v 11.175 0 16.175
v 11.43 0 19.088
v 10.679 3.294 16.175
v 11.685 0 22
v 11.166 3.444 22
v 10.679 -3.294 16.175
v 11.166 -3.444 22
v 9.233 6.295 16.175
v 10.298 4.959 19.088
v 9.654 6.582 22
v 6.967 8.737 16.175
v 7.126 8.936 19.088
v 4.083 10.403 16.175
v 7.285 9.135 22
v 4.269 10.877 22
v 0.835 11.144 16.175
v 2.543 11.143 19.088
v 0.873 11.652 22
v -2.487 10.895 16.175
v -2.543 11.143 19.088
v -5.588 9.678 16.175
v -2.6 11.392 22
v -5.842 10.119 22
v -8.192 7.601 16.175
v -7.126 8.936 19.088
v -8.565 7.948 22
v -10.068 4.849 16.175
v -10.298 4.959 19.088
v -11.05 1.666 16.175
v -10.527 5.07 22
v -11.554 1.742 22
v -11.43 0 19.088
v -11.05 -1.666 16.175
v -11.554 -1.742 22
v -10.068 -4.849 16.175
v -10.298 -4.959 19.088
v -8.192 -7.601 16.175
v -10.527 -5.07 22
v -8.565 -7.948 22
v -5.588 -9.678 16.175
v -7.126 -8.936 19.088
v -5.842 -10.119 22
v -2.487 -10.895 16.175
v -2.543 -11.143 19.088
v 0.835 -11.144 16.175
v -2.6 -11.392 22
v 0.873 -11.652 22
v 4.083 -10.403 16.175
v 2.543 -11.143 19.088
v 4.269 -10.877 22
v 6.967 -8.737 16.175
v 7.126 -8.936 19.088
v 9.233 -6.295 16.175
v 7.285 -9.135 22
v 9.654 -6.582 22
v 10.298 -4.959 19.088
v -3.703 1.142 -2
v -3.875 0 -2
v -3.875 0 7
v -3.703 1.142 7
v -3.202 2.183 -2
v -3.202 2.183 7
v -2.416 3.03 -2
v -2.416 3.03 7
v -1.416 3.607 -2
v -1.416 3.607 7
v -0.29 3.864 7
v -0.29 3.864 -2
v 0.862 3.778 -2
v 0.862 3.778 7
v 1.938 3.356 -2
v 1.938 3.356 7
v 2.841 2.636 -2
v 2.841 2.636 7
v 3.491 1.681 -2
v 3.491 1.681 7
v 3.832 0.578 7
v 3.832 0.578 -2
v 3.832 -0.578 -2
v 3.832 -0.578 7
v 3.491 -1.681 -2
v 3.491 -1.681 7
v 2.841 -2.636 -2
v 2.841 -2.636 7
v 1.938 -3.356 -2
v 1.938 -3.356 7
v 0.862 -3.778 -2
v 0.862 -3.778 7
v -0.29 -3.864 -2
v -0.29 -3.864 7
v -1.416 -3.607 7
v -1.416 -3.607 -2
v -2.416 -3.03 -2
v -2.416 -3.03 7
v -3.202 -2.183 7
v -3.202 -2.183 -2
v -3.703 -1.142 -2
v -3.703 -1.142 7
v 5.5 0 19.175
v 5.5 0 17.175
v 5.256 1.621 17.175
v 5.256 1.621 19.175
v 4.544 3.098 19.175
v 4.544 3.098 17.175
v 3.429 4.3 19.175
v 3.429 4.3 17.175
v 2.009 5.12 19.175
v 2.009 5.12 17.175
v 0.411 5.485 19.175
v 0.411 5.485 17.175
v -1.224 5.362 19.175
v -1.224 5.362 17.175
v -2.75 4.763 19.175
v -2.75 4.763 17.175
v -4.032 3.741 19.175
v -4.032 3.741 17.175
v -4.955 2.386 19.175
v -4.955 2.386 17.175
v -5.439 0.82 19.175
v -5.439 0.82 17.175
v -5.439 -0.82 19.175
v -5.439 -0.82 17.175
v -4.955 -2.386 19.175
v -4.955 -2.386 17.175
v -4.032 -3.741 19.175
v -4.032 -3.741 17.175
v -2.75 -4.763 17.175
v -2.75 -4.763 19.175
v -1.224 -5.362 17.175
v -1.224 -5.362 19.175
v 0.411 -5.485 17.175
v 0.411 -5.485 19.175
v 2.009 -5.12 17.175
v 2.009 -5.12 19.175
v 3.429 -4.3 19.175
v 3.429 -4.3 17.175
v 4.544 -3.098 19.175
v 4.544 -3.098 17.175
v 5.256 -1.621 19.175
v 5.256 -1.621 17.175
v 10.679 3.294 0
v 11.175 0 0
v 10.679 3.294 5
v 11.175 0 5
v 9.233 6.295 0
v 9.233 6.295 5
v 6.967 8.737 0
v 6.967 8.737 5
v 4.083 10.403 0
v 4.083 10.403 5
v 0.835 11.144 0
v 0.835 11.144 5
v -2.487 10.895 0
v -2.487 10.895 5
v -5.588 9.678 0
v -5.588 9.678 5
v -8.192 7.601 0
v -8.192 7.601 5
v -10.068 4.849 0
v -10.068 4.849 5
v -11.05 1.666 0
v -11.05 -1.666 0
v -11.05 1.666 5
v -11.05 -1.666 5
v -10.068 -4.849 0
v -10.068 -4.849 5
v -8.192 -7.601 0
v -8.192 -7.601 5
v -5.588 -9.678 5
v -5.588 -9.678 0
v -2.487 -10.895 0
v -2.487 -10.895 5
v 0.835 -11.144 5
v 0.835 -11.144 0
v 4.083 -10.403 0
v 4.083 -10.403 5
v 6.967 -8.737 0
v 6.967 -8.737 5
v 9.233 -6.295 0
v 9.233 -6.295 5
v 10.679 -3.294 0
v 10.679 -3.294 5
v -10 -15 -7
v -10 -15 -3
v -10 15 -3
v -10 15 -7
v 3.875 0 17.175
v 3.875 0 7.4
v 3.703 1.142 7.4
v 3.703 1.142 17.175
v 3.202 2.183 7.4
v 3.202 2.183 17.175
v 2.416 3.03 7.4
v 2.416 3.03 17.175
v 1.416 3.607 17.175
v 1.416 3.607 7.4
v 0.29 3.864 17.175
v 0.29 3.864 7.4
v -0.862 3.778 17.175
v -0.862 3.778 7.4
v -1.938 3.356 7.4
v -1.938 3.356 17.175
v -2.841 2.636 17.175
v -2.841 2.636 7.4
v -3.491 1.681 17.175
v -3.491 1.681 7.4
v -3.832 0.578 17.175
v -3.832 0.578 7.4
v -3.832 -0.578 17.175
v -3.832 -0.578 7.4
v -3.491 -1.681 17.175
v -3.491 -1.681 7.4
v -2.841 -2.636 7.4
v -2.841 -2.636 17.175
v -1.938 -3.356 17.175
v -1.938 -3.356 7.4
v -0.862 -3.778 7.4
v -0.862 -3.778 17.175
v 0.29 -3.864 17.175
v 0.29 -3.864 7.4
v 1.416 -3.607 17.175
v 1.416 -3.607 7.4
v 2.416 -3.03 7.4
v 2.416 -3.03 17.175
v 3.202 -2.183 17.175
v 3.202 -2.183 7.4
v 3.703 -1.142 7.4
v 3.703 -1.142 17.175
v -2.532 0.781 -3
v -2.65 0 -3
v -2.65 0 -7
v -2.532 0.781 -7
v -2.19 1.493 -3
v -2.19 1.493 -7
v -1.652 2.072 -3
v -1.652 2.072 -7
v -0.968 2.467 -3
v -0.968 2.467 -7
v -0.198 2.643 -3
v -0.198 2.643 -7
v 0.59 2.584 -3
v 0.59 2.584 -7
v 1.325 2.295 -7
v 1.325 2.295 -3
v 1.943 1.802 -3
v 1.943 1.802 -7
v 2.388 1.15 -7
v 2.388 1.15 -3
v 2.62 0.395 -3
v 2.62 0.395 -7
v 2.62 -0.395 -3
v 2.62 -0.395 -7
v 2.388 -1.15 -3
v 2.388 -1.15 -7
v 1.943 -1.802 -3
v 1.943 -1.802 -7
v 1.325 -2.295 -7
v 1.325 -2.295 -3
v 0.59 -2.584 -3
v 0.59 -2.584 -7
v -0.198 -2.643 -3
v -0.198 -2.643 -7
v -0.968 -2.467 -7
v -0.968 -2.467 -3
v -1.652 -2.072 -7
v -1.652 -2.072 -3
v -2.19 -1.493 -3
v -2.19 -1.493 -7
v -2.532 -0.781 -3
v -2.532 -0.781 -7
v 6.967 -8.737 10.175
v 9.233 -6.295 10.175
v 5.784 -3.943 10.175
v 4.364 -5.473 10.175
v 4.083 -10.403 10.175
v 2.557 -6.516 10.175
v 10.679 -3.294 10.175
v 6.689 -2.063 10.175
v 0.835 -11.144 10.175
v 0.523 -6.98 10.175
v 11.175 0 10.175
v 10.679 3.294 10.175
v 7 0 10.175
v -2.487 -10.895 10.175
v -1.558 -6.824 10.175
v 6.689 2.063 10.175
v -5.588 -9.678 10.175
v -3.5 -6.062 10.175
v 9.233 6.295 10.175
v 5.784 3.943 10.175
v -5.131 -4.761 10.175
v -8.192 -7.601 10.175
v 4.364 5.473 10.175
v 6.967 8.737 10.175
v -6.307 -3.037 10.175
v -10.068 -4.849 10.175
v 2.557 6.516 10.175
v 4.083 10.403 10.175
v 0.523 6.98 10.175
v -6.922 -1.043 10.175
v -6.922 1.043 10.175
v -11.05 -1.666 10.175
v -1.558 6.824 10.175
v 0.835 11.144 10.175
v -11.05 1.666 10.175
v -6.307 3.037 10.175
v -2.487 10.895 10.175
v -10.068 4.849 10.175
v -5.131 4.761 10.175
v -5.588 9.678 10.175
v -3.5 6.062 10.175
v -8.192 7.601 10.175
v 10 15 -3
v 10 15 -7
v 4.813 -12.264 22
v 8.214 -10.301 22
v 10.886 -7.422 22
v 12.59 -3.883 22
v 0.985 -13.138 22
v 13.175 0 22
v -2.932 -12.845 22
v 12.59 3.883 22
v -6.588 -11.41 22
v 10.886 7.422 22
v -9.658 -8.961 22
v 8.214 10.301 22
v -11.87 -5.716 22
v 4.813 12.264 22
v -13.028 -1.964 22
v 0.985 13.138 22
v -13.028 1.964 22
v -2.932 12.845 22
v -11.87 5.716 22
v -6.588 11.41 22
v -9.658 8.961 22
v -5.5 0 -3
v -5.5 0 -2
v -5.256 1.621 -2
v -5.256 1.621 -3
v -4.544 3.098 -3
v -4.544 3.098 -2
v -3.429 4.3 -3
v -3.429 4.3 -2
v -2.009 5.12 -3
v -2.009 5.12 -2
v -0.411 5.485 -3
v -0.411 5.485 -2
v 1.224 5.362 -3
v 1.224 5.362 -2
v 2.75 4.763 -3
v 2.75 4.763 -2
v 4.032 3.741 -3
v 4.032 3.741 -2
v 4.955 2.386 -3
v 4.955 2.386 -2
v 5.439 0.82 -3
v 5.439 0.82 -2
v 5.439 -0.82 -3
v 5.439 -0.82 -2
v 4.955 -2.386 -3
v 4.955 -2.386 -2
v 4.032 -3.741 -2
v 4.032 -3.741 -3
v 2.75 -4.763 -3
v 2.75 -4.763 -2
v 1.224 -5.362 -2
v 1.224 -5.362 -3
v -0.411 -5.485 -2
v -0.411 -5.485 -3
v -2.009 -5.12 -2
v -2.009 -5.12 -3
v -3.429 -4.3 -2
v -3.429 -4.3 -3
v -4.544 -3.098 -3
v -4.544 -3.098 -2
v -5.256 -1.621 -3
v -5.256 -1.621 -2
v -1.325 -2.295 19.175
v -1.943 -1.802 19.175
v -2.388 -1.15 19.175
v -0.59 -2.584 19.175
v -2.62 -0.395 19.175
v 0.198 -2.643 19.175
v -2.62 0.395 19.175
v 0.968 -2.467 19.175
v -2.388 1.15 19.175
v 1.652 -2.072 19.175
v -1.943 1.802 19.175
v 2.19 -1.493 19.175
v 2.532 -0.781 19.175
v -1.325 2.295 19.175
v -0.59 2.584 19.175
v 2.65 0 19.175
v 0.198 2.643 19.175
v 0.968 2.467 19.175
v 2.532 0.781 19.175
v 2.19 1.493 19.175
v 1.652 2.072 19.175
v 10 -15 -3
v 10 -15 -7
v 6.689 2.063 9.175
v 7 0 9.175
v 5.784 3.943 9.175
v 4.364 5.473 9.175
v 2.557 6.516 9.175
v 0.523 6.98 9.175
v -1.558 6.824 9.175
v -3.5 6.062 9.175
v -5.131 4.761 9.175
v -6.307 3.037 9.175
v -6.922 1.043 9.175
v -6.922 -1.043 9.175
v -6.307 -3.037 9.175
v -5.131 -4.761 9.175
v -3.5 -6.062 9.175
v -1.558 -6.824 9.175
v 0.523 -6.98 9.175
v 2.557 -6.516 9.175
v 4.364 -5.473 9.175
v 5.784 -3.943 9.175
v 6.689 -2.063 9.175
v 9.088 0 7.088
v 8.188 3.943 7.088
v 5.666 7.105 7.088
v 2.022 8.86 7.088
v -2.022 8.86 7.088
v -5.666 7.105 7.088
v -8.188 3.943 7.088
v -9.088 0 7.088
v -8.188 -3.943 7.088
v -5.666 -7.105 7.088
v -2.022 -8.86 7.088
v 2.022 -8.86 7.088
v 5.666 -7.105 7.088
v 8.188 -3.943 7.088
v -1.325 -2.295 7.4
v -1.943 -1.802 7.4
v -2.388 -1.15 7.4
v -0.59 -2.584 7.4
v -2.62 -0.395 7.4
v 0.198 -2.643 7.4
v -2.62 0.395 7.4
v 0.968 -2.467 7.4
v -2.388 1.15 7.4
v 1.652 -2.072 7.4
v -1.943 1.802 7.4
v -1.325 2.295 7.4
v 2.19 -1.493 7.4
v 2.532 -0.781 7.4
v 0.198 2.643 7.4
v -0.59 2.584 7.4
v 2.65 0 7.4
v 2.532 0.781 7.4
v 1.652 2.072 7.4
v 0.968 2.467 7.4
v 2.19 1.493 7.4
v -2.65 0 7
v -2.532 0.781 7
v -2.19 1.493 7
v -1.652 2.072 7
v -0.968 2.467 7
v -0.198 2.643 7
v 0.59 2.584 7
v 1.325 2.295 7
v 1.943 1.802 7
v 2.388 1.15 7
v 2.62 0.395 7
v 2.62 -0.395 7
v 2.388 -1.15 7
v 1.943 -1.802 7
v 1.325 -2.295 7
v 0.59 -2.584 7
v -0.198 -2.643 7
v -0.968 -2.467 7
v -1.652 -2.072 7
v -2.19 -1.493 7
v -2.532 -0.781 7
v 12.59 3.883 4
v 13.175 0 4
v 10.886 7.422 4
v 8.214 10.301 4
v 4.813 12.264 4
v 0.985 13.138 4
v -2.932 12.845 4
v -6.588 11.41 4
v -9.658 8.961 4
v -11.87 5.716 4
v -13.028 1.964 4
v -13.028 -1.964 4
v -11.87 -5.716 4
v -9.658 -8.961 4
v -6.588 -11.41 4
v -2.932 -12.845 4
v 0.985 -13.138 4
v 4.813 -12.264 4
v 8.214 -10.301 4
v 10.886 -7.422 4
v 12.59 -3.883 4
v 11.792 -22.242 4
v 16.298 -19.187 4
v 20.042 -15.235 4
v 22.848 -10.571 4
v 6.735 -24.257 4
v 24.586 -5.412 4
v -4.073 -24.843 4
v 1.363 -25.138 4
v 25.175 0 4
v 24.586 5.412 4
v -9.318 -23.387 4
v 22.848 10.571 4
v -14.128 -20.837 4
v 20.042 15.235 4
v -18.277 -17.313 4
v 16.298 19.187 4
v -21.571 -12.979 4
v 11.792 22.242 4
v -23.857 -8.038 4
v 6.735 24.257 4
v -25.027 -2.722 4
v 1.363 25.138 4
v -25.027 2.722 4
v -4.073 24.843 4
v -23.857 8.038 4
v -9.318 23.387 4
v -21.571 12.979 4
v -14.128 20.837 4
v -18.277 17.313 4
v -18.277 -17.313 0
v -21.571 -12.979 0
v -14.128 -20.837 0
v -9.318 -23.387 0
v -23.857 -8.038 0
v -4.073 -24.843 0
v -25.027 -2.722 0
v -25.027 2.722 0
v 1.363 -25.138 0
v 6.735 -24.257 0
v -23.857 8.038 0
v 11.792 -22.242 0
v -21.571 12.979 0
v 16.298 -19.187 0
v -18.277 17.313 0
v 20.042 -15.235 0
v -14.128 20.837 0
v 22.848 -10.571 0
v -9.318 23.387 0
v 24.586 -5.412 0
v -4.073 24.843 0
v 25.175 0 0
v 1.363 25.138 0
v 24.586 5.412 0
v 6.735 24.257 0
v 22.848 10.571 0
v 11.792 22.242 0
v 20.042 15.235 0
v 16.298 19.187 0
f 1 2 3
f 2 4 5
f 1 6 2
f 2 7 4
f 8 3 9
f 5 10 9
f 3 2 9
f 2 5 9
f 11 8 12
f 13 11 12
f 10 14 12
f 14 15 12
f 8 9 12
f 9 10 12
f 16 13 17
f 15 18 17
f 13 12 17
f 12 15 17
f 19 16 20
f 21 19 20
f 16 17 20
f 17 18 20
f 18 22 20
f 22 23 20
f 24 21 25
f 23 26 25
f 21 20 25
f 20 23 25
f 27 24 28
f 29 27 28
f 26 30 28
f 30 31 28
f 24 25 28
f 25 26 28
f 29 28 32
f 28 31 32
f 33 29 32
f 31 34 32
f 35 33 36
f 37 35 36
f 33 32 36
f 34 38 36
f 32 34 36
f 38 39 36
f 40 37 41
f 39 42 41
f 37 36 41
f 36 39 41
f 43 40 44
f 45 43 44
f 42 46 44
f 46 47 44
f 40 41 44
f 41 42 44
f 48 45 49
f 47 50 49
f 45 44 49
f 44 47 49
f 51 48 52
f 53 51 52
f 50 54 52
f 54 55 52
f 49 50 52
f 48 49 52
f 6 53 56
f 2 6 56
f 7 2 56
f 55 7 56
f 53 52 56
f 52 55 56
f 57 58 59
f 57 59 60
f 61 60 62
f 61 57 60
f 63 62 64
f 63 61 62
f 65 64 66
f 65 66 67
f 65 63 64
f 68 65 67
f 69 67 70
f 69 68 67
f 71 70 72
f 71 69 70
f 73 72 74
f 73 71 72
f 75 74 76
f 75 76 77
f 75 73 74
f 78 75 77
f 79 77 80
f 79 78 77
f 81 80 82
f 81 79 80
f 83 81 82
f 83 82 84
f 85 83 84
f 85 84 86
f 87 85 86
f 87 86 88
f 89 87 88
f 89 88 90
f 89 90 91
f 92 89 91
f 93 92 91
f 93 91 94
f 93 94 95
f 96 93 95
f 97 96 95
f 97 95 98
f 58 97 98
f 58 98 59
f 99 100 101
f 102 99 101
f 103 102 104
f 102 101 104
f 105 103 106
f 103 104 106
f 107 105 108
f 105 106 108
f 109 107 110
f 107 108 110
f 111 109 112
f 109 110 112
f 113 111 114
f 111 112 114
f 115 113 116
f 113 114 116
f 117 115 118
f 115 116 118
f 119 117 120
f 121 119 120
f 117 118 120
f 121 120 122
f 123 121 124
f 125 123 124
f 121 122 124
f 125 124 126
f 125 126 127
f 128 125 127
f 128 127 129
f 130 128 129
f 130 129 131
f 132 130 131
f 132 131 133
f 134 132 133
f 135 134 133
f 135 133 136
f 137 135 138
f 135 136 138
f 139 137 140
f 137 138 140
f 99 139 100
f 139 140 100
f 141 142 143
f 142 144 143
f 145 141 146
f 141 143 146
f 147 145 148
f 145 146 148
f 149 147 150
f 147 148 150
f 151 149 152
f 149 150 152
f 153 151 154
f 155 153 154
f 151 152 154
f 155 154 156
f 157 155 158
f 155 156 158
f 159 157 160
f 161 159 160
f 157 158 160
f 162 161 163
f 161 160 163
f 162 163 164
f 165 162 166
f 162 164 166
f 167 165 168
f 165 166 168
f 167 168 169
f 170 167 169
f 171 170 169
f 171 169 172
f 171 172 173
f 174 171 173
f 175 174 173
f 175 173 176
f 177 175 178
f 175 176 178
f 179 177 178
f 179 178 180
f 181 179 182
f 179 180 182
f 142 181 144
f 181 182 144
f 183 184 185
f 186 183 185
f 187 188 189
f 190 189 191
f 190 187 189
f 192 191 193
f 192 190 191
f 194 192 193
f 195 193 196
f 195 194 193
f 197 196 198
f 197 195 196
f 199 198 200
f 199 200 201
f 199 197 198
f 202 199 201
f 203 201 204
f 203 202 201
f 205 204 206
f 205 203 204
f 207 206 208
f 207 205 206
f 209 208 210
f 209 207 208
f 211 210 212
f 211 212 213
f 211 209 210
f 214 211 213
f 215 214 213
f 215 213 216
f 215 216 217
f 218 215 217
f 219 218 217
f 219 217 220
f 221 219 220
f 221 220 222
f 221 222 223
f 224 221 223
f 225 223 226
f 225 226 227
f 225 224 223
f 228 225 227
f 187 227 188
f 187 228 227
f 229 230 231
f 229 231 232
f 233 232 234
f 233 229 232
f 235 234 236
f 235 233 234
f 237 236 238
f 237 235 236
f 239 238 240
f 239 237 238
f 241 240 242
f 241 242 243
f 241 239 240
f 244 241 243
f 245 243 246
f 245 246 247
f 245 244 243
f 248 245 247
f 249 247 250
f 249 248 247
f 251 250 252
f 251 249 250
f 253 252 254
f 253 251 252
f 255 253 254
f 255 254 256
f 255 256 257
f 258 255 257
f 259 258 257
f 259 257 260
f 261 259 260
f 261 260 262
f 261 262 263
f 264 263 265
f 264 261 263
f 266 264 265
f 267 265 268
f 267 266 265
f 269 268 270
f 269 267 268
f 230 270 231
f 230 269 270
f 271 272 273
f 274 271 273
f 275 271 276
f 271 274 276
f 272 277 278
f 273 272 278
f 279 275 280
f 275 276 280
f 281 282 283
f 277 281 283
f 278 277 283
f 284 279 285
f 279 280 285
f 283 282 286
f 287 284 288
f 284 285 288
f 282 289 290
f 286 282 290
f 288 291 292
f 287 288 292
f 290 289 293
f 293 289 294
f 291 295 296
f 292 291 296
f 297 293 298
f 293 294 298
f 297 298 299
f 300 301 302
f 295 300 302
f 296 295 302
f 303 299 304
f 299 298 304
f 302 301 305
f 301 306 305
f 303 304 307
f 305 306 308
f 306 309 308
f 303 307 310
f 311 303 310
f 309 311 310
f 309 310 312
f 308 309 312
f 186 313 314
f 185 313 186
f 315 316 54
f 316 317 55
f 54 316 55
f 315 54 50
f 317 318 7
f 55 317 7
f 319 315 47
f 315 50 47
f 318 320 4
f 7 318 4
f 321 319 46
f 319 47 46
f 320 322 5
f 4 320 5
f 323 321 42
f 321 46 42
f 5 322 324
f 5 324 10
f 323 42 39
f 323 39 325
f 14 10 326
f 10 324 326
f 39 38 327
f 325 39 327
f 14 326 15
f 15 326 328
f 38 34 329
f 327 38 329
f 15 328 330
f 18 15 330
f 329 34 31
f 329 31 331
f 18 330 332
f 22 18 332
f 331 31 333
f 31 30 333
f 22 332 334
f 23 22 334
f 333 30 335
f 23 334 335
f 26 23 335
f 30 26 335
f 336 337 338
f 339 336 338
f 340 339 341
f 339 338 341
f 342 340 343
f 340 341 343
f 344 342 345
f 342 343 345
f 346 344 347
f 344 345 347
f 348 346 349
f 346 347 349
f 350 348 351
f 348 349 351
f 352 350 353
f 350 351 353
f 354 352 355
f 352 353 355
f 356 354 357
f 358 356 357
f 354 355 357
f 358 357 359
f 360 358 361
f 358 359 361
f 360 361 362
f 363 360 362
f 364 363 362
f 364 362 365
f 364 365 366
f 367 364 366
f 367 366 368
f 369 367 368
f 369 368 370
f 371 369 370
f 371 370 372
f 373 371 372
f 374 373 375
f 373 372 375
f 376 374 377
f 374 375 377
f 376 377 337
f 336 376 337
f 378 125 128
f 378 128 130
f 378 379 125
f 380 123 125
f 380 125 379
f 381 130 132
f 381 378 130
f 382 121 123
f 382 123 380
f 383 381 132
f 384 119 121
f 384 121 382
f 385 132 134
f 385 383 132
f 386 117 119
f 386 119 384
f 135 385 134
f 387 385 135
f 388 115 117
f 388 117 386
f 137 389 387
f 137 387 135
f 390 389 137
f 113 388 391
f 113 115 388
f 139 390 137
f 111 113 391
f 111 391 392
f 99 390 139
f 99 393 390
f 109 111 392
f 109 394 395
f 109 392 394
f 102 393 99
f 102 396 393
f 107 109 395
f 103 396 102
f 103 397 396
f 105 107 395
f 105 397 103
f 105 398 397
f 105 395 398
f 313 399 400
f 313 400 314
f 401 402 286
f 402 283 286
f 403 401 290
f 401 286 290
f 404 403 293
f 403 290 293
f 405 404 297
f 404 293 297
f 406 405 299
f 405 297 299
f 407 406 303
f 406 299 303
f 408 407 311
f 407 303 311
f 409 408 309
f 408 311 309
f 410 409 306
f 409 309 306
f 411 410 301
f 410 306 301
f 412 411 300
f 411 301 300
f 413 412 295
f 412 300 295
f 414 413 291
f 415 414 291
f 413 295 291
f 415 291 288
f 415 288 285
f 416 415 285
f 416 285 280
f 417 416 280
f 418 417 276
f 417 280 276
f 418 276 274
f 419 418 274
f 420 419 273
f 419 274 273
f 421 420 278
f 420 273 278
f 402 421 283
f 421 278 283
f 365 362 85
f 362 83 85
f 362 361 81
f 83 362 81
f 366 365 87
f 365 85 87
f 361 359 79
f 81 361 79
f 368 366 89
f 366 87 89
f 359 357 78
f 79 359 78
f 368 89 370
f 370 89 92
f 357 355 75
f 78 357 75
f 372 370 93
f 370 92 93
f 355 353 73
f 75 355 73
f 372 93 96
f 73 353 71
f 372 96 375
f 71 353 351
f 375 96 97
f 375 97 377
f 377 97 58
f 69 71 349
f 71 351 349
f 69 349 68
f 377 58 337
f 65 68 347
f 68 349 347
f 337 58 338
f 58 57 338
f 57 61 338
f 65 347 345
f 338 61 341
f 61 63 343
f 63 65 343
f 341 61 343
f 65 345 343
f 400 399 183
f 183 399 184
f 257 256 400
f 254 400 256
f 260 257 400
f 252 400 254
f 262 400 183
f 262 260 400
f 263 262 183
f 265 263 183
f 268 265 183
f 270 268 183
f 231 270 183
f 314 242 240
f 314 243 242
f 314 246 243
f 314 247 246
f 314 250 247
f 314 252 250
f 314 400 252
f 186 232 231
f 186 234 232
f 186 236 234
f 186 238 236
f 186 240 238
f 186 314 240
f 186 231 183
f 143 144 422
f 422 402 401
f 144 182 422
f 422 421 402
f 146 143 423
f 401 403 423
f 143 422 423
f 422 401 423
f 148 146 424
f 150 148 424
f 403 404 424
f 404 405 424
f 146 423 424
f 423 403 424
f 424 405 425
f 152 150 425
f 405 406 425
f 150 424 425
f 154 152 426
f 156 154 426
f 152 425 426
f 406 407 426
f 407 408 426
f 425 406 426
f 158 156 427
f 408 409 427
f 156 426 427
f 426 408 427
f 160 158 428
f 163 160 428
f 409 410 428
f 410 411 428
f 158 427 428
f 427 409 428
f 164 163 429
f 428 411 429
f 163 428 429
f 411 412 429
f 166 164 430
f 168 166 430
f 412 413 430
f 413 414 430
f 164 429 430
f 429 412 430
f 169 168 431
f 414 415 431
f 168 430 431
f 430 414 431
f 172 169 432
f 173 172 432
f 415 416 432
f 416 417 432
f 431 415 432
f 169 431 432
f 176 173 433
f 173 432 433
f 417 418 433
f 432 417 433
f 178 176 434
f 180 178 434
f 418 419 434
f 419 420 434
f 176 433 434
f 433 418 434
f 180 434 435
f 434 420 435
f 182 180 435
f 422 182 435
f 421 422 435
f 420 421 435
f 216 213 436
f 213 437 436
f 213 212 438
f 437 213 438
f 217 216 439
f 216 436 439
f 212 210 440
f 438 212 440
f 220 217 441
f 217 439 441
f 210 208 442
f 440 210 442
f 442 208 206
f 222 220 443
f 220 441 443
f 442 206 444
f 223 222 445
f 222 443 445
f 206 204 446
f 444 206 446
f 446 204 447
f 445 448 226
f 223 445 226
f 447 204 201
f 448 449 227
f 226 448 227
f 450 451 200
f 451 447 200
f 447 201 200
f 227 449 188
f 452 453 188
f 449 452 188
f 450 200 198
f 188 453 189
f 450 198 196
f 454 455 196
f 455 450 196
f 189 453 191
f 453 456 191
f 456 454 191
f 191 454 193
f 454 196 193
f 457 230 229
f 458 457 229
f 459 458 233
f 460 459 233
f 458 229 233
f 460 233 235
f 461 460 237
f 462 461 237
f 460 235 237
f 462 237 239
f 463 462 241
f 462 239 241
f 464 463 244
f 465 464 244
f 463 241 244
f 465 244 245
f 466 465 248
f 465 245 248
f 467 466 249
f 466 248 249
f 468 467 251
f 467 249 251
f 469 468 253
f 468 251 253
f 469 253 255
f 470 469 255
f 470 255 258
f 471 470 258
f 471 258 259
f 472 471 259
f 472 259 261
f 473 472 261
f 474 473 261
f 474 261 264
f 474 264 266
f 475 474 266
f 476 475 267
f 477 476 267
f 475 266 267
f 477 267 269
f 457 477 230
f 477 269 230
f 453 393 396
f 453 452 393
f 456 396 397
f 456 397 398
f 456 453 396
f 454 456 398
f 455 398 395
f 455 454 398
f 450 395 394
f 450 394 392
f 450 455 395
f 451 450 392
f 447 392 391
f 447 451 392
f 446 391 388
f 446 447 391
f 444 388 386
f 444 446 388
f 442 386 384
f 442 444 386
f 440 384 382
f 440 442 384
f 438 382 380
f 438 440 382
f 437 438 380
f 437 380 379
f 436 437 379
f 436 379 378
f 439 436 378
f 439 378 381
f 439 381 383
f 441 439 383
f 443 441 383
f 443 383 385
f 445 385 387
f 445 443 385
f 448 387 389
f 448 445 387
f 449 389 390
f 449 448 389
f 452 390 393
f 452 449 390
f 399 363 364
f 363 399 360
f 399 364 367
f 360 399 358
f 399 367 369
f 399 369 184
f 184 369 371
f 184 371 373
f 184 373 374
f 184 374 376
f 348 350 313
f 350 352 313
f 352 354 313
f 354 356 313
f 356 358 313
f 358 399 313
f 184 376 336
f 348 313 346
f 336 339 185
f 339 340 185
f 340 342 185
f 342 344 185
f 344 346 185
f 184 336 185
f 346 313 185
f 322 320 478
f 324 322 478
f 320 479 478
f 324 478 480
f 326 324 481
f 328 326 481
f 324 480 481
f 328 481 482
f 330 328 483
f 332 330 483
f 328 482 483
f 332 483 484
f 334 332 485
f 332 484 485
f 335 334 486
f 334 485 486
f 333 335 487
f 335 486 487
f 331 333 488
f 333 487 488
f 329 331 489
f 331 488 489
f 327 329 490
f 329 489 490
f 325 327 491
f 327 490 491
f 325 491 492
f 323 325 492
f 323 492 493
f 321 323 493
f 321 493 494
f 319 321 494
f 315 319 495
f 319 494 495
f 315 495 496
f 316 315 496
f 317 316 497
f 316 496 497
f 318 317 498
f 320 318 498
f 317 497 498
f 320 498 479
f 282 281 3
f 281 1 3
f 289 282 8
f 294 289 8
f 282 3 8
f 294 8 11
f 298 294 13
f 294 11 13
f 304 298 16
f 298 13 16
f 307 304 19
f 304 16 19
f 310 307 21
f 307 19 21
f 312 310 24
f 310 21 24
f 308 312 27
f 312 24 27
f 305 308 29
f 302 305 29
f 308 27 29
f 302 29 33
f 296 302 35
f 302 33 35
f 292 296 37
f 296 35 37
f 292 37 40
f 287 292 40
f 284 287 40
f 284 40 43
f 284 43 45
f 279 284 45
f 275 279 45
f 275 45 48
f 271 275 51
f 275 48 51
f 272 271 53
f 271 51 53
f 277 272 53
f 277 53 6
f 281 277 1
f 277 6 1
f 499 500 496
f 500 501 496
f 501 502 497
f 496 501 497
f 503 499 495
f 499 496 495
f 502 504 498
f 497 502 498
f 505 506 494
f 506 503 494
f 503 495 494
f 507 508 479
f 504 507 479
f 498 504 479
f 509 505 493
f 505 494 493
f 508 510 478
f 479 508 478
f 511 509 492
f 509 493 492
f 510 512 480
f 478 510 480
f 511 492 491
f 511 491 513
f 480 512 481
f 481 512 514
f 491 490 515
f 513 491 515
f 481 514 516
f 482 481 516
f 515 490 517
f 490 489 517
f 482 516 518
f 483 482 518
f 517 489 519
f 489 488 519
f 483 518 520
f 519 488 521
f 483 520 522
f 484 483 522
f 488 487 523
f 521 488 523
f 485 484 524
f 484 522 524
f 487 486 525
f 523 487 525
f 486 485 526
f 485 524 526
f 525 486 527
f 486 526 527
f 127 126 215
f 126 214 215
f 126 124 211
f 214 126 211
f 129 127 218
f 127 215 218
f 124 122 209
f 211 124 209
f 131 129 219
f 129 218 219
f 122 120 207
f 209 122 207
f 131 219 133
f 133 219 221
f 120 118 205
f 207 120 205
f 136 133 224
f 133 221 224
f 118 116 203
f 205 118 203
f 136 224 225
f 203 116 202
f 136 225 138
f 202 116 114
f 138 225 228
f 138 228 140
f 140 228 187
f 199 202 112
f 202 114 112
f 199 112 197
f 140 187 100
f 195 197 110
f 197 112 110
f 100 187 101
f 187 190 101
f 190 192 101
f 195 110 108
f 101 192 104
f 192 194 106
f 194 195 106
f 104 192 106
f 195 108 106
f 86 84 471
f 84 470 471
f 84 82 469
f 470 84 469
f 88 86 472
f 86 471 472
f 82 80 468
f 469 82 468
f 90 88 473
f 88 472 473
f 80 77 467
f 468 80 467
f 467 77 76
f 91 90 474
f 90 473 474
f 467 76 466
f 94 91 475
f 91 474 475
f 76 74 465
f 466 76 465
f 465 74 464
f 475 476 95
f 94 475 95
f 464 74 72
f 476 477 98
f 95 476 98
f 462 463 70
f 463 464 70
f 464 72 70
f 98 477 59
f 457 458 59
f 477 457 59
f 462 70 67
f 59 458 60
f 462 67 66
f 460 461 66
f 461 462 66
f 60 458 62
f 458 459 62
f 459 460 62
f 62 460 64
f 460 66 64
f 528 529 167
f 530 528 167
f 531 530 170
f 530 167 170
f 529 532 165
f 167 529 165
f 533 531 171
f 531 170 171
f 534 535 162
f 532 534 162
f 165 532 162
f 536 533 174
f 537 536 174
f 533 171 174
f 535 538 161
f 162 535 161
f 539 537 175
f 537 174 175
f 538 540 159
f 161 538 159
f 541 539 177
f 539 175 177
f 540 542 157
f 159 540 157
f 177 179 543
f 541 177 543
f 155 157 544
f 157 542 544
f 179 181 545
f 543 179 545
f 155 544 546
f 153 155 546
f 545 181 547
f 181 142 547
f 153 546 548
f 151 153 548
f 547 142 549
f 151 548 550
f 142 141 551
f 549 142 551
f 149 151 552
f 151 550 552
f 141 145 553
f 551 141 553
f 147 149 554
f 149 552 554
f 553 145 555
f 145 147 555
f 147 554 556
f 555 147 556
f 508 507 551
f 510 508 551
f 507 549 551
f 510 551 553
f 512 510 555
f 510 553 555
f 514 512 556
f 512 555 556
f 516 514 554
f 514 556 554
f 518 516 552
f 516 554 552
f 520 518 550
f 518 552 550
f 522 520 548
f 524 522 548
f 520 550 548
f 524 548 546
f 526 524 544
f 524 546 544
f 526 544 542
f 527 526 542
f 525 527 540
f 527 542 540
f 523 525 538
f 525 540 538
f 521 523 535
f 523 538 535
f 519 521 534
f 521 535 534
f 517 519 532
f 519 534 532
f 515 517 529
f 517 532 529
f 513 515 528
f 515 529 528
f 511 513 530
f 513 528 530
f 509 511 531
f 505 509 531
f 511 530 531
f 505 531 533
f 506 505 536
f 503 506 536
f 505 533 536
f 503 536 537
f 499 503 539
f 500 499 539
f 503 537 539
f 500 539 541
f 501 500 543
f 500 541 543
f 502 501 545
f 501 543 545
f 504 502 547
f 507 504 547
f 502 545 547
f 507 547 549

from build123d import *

# Parameters (mm, degrees)
BOSS_EXTRUDE1_START = 1
SKETCH3_W           = 20
SKETCH3_H           = 30
SKETCH3_R           = 2.65
BOSS_EXTRUDE1_DEPTH = 4
BOSS_EXTRUDE3_START = 1
SKETCH3_4_R         = 3.875
SKETCH3_4_R_2       = 2.65
BOSS_EXTRUDE3_DEPTH = 10
SKETCH3_5_R         = 5.5
SKETCH3_5_R_2       = 3.875
BOSS_EXTRUDE4_DEPTH = 1
SKETCH4_R           = 3.875
SKETCH4_R_2         = 2.65
BOSS_EXTRUDE5_DEPTH = 9.775
SKETCH4_3_R         = 5.5
SKETCH4_3_R_2       = 3.875
SKETCH4_3_R_3       = 2.65
BOSS_EXTRUDE6_DEPTH = 2


with BuildPart() as part:
    # Sketch2 → Revolve1 (revolve)
    with BuildSketch(Plane(origin=(0, 0, 0), x_dir=(1, 0, 0), z_dir=(0, 1, 0))):
        Polygon((11.175, 0), (11.175, -5), (7, -9.175), (7, -10.175), (11.175, -10.175), (11.175, -16.175), (11.684621465, -22), (13.175, -22), (13.175, -4), (25.175, -4), (25.175, 0), align=None)
    revolve(axis=Axis((0, 0, 0), (0, 0, 1)))


with BuildPart() as body_2:
    # Sketch3 → Boss-Extrude1 (new body)
    with BuildSketch(Plane(origin=(0, 0, -2), x_dir=(-1, 0, 0), z_dir=(0, 0, -1)).offset(BOSS_EXTRUDE1_START)):
        Rectangle(SKETCH3_W, SKETCH3_H)
        Circle(SKETCH3_R, mode=Mode.SUBTRACT)
    extrude(amount=BOSS_EXTRUDE1_DEPTH)

    # Sketch3<4> → Boss-Extrude3 (add)
    with BuildSketch(Plane(origin=(0, 0, -2), x_dir=(-1, 0, 0), z_dir=(0, 0, -1)).offset(BOSS_EXTRUDE3_START)):
        Circle(SKETCH3_4_R)
        Circle(SKETCH3_4_R_2, mode=Mode.SUBTRACT)
    extrude(amount=-BOSS_EXTRUDE3_DEPTH)

    # Sketch3<5> → Boss-Extrude4 (add)
    with BuildSketch(Plane(origin=(0, 0, -2), x_dir=(-1, 0, 0), z_dir=(0, 0, -1))):
        Circle(SKETCH3_5_R)
        Circle(SKETCH3_5_R_2, mode=Mode.SUBTRACT)
    extrude(amount=BOSS_EXTRUDE4_DEPTH)


with BuildPart() as body_3:
    # Sketch4 → Boss-Extrude5 (new body)
    with BuildSketch(Plane.XY.offset(17.175)):
        Circle(SKETCH4_R)
        Circle(SKETCH4_R_2, mode=Mode.SUBTRACT)
    extrude(amount=-BOSS_EXTRUDE5_DEPTH)

    # Sketch4<3> → Boss-Extrude6 (add)
    with BuildSketch(Plane.XY.offset(17.175)):
        Circle(SKETCH4_3_R)
        Circle(SKETCH4_3_R_2, mode=Mode.SUBTRACT)
        Circle(SKETCH4_3_R_2)
        Circle(SKETCH4_3_R_3, mode=Mode.SUBTRACT)
    extrude(amount=BOSS_EXTRUDE6_DEPTH)


solid = Compound([part.part, body_2.part, body_3.part])
